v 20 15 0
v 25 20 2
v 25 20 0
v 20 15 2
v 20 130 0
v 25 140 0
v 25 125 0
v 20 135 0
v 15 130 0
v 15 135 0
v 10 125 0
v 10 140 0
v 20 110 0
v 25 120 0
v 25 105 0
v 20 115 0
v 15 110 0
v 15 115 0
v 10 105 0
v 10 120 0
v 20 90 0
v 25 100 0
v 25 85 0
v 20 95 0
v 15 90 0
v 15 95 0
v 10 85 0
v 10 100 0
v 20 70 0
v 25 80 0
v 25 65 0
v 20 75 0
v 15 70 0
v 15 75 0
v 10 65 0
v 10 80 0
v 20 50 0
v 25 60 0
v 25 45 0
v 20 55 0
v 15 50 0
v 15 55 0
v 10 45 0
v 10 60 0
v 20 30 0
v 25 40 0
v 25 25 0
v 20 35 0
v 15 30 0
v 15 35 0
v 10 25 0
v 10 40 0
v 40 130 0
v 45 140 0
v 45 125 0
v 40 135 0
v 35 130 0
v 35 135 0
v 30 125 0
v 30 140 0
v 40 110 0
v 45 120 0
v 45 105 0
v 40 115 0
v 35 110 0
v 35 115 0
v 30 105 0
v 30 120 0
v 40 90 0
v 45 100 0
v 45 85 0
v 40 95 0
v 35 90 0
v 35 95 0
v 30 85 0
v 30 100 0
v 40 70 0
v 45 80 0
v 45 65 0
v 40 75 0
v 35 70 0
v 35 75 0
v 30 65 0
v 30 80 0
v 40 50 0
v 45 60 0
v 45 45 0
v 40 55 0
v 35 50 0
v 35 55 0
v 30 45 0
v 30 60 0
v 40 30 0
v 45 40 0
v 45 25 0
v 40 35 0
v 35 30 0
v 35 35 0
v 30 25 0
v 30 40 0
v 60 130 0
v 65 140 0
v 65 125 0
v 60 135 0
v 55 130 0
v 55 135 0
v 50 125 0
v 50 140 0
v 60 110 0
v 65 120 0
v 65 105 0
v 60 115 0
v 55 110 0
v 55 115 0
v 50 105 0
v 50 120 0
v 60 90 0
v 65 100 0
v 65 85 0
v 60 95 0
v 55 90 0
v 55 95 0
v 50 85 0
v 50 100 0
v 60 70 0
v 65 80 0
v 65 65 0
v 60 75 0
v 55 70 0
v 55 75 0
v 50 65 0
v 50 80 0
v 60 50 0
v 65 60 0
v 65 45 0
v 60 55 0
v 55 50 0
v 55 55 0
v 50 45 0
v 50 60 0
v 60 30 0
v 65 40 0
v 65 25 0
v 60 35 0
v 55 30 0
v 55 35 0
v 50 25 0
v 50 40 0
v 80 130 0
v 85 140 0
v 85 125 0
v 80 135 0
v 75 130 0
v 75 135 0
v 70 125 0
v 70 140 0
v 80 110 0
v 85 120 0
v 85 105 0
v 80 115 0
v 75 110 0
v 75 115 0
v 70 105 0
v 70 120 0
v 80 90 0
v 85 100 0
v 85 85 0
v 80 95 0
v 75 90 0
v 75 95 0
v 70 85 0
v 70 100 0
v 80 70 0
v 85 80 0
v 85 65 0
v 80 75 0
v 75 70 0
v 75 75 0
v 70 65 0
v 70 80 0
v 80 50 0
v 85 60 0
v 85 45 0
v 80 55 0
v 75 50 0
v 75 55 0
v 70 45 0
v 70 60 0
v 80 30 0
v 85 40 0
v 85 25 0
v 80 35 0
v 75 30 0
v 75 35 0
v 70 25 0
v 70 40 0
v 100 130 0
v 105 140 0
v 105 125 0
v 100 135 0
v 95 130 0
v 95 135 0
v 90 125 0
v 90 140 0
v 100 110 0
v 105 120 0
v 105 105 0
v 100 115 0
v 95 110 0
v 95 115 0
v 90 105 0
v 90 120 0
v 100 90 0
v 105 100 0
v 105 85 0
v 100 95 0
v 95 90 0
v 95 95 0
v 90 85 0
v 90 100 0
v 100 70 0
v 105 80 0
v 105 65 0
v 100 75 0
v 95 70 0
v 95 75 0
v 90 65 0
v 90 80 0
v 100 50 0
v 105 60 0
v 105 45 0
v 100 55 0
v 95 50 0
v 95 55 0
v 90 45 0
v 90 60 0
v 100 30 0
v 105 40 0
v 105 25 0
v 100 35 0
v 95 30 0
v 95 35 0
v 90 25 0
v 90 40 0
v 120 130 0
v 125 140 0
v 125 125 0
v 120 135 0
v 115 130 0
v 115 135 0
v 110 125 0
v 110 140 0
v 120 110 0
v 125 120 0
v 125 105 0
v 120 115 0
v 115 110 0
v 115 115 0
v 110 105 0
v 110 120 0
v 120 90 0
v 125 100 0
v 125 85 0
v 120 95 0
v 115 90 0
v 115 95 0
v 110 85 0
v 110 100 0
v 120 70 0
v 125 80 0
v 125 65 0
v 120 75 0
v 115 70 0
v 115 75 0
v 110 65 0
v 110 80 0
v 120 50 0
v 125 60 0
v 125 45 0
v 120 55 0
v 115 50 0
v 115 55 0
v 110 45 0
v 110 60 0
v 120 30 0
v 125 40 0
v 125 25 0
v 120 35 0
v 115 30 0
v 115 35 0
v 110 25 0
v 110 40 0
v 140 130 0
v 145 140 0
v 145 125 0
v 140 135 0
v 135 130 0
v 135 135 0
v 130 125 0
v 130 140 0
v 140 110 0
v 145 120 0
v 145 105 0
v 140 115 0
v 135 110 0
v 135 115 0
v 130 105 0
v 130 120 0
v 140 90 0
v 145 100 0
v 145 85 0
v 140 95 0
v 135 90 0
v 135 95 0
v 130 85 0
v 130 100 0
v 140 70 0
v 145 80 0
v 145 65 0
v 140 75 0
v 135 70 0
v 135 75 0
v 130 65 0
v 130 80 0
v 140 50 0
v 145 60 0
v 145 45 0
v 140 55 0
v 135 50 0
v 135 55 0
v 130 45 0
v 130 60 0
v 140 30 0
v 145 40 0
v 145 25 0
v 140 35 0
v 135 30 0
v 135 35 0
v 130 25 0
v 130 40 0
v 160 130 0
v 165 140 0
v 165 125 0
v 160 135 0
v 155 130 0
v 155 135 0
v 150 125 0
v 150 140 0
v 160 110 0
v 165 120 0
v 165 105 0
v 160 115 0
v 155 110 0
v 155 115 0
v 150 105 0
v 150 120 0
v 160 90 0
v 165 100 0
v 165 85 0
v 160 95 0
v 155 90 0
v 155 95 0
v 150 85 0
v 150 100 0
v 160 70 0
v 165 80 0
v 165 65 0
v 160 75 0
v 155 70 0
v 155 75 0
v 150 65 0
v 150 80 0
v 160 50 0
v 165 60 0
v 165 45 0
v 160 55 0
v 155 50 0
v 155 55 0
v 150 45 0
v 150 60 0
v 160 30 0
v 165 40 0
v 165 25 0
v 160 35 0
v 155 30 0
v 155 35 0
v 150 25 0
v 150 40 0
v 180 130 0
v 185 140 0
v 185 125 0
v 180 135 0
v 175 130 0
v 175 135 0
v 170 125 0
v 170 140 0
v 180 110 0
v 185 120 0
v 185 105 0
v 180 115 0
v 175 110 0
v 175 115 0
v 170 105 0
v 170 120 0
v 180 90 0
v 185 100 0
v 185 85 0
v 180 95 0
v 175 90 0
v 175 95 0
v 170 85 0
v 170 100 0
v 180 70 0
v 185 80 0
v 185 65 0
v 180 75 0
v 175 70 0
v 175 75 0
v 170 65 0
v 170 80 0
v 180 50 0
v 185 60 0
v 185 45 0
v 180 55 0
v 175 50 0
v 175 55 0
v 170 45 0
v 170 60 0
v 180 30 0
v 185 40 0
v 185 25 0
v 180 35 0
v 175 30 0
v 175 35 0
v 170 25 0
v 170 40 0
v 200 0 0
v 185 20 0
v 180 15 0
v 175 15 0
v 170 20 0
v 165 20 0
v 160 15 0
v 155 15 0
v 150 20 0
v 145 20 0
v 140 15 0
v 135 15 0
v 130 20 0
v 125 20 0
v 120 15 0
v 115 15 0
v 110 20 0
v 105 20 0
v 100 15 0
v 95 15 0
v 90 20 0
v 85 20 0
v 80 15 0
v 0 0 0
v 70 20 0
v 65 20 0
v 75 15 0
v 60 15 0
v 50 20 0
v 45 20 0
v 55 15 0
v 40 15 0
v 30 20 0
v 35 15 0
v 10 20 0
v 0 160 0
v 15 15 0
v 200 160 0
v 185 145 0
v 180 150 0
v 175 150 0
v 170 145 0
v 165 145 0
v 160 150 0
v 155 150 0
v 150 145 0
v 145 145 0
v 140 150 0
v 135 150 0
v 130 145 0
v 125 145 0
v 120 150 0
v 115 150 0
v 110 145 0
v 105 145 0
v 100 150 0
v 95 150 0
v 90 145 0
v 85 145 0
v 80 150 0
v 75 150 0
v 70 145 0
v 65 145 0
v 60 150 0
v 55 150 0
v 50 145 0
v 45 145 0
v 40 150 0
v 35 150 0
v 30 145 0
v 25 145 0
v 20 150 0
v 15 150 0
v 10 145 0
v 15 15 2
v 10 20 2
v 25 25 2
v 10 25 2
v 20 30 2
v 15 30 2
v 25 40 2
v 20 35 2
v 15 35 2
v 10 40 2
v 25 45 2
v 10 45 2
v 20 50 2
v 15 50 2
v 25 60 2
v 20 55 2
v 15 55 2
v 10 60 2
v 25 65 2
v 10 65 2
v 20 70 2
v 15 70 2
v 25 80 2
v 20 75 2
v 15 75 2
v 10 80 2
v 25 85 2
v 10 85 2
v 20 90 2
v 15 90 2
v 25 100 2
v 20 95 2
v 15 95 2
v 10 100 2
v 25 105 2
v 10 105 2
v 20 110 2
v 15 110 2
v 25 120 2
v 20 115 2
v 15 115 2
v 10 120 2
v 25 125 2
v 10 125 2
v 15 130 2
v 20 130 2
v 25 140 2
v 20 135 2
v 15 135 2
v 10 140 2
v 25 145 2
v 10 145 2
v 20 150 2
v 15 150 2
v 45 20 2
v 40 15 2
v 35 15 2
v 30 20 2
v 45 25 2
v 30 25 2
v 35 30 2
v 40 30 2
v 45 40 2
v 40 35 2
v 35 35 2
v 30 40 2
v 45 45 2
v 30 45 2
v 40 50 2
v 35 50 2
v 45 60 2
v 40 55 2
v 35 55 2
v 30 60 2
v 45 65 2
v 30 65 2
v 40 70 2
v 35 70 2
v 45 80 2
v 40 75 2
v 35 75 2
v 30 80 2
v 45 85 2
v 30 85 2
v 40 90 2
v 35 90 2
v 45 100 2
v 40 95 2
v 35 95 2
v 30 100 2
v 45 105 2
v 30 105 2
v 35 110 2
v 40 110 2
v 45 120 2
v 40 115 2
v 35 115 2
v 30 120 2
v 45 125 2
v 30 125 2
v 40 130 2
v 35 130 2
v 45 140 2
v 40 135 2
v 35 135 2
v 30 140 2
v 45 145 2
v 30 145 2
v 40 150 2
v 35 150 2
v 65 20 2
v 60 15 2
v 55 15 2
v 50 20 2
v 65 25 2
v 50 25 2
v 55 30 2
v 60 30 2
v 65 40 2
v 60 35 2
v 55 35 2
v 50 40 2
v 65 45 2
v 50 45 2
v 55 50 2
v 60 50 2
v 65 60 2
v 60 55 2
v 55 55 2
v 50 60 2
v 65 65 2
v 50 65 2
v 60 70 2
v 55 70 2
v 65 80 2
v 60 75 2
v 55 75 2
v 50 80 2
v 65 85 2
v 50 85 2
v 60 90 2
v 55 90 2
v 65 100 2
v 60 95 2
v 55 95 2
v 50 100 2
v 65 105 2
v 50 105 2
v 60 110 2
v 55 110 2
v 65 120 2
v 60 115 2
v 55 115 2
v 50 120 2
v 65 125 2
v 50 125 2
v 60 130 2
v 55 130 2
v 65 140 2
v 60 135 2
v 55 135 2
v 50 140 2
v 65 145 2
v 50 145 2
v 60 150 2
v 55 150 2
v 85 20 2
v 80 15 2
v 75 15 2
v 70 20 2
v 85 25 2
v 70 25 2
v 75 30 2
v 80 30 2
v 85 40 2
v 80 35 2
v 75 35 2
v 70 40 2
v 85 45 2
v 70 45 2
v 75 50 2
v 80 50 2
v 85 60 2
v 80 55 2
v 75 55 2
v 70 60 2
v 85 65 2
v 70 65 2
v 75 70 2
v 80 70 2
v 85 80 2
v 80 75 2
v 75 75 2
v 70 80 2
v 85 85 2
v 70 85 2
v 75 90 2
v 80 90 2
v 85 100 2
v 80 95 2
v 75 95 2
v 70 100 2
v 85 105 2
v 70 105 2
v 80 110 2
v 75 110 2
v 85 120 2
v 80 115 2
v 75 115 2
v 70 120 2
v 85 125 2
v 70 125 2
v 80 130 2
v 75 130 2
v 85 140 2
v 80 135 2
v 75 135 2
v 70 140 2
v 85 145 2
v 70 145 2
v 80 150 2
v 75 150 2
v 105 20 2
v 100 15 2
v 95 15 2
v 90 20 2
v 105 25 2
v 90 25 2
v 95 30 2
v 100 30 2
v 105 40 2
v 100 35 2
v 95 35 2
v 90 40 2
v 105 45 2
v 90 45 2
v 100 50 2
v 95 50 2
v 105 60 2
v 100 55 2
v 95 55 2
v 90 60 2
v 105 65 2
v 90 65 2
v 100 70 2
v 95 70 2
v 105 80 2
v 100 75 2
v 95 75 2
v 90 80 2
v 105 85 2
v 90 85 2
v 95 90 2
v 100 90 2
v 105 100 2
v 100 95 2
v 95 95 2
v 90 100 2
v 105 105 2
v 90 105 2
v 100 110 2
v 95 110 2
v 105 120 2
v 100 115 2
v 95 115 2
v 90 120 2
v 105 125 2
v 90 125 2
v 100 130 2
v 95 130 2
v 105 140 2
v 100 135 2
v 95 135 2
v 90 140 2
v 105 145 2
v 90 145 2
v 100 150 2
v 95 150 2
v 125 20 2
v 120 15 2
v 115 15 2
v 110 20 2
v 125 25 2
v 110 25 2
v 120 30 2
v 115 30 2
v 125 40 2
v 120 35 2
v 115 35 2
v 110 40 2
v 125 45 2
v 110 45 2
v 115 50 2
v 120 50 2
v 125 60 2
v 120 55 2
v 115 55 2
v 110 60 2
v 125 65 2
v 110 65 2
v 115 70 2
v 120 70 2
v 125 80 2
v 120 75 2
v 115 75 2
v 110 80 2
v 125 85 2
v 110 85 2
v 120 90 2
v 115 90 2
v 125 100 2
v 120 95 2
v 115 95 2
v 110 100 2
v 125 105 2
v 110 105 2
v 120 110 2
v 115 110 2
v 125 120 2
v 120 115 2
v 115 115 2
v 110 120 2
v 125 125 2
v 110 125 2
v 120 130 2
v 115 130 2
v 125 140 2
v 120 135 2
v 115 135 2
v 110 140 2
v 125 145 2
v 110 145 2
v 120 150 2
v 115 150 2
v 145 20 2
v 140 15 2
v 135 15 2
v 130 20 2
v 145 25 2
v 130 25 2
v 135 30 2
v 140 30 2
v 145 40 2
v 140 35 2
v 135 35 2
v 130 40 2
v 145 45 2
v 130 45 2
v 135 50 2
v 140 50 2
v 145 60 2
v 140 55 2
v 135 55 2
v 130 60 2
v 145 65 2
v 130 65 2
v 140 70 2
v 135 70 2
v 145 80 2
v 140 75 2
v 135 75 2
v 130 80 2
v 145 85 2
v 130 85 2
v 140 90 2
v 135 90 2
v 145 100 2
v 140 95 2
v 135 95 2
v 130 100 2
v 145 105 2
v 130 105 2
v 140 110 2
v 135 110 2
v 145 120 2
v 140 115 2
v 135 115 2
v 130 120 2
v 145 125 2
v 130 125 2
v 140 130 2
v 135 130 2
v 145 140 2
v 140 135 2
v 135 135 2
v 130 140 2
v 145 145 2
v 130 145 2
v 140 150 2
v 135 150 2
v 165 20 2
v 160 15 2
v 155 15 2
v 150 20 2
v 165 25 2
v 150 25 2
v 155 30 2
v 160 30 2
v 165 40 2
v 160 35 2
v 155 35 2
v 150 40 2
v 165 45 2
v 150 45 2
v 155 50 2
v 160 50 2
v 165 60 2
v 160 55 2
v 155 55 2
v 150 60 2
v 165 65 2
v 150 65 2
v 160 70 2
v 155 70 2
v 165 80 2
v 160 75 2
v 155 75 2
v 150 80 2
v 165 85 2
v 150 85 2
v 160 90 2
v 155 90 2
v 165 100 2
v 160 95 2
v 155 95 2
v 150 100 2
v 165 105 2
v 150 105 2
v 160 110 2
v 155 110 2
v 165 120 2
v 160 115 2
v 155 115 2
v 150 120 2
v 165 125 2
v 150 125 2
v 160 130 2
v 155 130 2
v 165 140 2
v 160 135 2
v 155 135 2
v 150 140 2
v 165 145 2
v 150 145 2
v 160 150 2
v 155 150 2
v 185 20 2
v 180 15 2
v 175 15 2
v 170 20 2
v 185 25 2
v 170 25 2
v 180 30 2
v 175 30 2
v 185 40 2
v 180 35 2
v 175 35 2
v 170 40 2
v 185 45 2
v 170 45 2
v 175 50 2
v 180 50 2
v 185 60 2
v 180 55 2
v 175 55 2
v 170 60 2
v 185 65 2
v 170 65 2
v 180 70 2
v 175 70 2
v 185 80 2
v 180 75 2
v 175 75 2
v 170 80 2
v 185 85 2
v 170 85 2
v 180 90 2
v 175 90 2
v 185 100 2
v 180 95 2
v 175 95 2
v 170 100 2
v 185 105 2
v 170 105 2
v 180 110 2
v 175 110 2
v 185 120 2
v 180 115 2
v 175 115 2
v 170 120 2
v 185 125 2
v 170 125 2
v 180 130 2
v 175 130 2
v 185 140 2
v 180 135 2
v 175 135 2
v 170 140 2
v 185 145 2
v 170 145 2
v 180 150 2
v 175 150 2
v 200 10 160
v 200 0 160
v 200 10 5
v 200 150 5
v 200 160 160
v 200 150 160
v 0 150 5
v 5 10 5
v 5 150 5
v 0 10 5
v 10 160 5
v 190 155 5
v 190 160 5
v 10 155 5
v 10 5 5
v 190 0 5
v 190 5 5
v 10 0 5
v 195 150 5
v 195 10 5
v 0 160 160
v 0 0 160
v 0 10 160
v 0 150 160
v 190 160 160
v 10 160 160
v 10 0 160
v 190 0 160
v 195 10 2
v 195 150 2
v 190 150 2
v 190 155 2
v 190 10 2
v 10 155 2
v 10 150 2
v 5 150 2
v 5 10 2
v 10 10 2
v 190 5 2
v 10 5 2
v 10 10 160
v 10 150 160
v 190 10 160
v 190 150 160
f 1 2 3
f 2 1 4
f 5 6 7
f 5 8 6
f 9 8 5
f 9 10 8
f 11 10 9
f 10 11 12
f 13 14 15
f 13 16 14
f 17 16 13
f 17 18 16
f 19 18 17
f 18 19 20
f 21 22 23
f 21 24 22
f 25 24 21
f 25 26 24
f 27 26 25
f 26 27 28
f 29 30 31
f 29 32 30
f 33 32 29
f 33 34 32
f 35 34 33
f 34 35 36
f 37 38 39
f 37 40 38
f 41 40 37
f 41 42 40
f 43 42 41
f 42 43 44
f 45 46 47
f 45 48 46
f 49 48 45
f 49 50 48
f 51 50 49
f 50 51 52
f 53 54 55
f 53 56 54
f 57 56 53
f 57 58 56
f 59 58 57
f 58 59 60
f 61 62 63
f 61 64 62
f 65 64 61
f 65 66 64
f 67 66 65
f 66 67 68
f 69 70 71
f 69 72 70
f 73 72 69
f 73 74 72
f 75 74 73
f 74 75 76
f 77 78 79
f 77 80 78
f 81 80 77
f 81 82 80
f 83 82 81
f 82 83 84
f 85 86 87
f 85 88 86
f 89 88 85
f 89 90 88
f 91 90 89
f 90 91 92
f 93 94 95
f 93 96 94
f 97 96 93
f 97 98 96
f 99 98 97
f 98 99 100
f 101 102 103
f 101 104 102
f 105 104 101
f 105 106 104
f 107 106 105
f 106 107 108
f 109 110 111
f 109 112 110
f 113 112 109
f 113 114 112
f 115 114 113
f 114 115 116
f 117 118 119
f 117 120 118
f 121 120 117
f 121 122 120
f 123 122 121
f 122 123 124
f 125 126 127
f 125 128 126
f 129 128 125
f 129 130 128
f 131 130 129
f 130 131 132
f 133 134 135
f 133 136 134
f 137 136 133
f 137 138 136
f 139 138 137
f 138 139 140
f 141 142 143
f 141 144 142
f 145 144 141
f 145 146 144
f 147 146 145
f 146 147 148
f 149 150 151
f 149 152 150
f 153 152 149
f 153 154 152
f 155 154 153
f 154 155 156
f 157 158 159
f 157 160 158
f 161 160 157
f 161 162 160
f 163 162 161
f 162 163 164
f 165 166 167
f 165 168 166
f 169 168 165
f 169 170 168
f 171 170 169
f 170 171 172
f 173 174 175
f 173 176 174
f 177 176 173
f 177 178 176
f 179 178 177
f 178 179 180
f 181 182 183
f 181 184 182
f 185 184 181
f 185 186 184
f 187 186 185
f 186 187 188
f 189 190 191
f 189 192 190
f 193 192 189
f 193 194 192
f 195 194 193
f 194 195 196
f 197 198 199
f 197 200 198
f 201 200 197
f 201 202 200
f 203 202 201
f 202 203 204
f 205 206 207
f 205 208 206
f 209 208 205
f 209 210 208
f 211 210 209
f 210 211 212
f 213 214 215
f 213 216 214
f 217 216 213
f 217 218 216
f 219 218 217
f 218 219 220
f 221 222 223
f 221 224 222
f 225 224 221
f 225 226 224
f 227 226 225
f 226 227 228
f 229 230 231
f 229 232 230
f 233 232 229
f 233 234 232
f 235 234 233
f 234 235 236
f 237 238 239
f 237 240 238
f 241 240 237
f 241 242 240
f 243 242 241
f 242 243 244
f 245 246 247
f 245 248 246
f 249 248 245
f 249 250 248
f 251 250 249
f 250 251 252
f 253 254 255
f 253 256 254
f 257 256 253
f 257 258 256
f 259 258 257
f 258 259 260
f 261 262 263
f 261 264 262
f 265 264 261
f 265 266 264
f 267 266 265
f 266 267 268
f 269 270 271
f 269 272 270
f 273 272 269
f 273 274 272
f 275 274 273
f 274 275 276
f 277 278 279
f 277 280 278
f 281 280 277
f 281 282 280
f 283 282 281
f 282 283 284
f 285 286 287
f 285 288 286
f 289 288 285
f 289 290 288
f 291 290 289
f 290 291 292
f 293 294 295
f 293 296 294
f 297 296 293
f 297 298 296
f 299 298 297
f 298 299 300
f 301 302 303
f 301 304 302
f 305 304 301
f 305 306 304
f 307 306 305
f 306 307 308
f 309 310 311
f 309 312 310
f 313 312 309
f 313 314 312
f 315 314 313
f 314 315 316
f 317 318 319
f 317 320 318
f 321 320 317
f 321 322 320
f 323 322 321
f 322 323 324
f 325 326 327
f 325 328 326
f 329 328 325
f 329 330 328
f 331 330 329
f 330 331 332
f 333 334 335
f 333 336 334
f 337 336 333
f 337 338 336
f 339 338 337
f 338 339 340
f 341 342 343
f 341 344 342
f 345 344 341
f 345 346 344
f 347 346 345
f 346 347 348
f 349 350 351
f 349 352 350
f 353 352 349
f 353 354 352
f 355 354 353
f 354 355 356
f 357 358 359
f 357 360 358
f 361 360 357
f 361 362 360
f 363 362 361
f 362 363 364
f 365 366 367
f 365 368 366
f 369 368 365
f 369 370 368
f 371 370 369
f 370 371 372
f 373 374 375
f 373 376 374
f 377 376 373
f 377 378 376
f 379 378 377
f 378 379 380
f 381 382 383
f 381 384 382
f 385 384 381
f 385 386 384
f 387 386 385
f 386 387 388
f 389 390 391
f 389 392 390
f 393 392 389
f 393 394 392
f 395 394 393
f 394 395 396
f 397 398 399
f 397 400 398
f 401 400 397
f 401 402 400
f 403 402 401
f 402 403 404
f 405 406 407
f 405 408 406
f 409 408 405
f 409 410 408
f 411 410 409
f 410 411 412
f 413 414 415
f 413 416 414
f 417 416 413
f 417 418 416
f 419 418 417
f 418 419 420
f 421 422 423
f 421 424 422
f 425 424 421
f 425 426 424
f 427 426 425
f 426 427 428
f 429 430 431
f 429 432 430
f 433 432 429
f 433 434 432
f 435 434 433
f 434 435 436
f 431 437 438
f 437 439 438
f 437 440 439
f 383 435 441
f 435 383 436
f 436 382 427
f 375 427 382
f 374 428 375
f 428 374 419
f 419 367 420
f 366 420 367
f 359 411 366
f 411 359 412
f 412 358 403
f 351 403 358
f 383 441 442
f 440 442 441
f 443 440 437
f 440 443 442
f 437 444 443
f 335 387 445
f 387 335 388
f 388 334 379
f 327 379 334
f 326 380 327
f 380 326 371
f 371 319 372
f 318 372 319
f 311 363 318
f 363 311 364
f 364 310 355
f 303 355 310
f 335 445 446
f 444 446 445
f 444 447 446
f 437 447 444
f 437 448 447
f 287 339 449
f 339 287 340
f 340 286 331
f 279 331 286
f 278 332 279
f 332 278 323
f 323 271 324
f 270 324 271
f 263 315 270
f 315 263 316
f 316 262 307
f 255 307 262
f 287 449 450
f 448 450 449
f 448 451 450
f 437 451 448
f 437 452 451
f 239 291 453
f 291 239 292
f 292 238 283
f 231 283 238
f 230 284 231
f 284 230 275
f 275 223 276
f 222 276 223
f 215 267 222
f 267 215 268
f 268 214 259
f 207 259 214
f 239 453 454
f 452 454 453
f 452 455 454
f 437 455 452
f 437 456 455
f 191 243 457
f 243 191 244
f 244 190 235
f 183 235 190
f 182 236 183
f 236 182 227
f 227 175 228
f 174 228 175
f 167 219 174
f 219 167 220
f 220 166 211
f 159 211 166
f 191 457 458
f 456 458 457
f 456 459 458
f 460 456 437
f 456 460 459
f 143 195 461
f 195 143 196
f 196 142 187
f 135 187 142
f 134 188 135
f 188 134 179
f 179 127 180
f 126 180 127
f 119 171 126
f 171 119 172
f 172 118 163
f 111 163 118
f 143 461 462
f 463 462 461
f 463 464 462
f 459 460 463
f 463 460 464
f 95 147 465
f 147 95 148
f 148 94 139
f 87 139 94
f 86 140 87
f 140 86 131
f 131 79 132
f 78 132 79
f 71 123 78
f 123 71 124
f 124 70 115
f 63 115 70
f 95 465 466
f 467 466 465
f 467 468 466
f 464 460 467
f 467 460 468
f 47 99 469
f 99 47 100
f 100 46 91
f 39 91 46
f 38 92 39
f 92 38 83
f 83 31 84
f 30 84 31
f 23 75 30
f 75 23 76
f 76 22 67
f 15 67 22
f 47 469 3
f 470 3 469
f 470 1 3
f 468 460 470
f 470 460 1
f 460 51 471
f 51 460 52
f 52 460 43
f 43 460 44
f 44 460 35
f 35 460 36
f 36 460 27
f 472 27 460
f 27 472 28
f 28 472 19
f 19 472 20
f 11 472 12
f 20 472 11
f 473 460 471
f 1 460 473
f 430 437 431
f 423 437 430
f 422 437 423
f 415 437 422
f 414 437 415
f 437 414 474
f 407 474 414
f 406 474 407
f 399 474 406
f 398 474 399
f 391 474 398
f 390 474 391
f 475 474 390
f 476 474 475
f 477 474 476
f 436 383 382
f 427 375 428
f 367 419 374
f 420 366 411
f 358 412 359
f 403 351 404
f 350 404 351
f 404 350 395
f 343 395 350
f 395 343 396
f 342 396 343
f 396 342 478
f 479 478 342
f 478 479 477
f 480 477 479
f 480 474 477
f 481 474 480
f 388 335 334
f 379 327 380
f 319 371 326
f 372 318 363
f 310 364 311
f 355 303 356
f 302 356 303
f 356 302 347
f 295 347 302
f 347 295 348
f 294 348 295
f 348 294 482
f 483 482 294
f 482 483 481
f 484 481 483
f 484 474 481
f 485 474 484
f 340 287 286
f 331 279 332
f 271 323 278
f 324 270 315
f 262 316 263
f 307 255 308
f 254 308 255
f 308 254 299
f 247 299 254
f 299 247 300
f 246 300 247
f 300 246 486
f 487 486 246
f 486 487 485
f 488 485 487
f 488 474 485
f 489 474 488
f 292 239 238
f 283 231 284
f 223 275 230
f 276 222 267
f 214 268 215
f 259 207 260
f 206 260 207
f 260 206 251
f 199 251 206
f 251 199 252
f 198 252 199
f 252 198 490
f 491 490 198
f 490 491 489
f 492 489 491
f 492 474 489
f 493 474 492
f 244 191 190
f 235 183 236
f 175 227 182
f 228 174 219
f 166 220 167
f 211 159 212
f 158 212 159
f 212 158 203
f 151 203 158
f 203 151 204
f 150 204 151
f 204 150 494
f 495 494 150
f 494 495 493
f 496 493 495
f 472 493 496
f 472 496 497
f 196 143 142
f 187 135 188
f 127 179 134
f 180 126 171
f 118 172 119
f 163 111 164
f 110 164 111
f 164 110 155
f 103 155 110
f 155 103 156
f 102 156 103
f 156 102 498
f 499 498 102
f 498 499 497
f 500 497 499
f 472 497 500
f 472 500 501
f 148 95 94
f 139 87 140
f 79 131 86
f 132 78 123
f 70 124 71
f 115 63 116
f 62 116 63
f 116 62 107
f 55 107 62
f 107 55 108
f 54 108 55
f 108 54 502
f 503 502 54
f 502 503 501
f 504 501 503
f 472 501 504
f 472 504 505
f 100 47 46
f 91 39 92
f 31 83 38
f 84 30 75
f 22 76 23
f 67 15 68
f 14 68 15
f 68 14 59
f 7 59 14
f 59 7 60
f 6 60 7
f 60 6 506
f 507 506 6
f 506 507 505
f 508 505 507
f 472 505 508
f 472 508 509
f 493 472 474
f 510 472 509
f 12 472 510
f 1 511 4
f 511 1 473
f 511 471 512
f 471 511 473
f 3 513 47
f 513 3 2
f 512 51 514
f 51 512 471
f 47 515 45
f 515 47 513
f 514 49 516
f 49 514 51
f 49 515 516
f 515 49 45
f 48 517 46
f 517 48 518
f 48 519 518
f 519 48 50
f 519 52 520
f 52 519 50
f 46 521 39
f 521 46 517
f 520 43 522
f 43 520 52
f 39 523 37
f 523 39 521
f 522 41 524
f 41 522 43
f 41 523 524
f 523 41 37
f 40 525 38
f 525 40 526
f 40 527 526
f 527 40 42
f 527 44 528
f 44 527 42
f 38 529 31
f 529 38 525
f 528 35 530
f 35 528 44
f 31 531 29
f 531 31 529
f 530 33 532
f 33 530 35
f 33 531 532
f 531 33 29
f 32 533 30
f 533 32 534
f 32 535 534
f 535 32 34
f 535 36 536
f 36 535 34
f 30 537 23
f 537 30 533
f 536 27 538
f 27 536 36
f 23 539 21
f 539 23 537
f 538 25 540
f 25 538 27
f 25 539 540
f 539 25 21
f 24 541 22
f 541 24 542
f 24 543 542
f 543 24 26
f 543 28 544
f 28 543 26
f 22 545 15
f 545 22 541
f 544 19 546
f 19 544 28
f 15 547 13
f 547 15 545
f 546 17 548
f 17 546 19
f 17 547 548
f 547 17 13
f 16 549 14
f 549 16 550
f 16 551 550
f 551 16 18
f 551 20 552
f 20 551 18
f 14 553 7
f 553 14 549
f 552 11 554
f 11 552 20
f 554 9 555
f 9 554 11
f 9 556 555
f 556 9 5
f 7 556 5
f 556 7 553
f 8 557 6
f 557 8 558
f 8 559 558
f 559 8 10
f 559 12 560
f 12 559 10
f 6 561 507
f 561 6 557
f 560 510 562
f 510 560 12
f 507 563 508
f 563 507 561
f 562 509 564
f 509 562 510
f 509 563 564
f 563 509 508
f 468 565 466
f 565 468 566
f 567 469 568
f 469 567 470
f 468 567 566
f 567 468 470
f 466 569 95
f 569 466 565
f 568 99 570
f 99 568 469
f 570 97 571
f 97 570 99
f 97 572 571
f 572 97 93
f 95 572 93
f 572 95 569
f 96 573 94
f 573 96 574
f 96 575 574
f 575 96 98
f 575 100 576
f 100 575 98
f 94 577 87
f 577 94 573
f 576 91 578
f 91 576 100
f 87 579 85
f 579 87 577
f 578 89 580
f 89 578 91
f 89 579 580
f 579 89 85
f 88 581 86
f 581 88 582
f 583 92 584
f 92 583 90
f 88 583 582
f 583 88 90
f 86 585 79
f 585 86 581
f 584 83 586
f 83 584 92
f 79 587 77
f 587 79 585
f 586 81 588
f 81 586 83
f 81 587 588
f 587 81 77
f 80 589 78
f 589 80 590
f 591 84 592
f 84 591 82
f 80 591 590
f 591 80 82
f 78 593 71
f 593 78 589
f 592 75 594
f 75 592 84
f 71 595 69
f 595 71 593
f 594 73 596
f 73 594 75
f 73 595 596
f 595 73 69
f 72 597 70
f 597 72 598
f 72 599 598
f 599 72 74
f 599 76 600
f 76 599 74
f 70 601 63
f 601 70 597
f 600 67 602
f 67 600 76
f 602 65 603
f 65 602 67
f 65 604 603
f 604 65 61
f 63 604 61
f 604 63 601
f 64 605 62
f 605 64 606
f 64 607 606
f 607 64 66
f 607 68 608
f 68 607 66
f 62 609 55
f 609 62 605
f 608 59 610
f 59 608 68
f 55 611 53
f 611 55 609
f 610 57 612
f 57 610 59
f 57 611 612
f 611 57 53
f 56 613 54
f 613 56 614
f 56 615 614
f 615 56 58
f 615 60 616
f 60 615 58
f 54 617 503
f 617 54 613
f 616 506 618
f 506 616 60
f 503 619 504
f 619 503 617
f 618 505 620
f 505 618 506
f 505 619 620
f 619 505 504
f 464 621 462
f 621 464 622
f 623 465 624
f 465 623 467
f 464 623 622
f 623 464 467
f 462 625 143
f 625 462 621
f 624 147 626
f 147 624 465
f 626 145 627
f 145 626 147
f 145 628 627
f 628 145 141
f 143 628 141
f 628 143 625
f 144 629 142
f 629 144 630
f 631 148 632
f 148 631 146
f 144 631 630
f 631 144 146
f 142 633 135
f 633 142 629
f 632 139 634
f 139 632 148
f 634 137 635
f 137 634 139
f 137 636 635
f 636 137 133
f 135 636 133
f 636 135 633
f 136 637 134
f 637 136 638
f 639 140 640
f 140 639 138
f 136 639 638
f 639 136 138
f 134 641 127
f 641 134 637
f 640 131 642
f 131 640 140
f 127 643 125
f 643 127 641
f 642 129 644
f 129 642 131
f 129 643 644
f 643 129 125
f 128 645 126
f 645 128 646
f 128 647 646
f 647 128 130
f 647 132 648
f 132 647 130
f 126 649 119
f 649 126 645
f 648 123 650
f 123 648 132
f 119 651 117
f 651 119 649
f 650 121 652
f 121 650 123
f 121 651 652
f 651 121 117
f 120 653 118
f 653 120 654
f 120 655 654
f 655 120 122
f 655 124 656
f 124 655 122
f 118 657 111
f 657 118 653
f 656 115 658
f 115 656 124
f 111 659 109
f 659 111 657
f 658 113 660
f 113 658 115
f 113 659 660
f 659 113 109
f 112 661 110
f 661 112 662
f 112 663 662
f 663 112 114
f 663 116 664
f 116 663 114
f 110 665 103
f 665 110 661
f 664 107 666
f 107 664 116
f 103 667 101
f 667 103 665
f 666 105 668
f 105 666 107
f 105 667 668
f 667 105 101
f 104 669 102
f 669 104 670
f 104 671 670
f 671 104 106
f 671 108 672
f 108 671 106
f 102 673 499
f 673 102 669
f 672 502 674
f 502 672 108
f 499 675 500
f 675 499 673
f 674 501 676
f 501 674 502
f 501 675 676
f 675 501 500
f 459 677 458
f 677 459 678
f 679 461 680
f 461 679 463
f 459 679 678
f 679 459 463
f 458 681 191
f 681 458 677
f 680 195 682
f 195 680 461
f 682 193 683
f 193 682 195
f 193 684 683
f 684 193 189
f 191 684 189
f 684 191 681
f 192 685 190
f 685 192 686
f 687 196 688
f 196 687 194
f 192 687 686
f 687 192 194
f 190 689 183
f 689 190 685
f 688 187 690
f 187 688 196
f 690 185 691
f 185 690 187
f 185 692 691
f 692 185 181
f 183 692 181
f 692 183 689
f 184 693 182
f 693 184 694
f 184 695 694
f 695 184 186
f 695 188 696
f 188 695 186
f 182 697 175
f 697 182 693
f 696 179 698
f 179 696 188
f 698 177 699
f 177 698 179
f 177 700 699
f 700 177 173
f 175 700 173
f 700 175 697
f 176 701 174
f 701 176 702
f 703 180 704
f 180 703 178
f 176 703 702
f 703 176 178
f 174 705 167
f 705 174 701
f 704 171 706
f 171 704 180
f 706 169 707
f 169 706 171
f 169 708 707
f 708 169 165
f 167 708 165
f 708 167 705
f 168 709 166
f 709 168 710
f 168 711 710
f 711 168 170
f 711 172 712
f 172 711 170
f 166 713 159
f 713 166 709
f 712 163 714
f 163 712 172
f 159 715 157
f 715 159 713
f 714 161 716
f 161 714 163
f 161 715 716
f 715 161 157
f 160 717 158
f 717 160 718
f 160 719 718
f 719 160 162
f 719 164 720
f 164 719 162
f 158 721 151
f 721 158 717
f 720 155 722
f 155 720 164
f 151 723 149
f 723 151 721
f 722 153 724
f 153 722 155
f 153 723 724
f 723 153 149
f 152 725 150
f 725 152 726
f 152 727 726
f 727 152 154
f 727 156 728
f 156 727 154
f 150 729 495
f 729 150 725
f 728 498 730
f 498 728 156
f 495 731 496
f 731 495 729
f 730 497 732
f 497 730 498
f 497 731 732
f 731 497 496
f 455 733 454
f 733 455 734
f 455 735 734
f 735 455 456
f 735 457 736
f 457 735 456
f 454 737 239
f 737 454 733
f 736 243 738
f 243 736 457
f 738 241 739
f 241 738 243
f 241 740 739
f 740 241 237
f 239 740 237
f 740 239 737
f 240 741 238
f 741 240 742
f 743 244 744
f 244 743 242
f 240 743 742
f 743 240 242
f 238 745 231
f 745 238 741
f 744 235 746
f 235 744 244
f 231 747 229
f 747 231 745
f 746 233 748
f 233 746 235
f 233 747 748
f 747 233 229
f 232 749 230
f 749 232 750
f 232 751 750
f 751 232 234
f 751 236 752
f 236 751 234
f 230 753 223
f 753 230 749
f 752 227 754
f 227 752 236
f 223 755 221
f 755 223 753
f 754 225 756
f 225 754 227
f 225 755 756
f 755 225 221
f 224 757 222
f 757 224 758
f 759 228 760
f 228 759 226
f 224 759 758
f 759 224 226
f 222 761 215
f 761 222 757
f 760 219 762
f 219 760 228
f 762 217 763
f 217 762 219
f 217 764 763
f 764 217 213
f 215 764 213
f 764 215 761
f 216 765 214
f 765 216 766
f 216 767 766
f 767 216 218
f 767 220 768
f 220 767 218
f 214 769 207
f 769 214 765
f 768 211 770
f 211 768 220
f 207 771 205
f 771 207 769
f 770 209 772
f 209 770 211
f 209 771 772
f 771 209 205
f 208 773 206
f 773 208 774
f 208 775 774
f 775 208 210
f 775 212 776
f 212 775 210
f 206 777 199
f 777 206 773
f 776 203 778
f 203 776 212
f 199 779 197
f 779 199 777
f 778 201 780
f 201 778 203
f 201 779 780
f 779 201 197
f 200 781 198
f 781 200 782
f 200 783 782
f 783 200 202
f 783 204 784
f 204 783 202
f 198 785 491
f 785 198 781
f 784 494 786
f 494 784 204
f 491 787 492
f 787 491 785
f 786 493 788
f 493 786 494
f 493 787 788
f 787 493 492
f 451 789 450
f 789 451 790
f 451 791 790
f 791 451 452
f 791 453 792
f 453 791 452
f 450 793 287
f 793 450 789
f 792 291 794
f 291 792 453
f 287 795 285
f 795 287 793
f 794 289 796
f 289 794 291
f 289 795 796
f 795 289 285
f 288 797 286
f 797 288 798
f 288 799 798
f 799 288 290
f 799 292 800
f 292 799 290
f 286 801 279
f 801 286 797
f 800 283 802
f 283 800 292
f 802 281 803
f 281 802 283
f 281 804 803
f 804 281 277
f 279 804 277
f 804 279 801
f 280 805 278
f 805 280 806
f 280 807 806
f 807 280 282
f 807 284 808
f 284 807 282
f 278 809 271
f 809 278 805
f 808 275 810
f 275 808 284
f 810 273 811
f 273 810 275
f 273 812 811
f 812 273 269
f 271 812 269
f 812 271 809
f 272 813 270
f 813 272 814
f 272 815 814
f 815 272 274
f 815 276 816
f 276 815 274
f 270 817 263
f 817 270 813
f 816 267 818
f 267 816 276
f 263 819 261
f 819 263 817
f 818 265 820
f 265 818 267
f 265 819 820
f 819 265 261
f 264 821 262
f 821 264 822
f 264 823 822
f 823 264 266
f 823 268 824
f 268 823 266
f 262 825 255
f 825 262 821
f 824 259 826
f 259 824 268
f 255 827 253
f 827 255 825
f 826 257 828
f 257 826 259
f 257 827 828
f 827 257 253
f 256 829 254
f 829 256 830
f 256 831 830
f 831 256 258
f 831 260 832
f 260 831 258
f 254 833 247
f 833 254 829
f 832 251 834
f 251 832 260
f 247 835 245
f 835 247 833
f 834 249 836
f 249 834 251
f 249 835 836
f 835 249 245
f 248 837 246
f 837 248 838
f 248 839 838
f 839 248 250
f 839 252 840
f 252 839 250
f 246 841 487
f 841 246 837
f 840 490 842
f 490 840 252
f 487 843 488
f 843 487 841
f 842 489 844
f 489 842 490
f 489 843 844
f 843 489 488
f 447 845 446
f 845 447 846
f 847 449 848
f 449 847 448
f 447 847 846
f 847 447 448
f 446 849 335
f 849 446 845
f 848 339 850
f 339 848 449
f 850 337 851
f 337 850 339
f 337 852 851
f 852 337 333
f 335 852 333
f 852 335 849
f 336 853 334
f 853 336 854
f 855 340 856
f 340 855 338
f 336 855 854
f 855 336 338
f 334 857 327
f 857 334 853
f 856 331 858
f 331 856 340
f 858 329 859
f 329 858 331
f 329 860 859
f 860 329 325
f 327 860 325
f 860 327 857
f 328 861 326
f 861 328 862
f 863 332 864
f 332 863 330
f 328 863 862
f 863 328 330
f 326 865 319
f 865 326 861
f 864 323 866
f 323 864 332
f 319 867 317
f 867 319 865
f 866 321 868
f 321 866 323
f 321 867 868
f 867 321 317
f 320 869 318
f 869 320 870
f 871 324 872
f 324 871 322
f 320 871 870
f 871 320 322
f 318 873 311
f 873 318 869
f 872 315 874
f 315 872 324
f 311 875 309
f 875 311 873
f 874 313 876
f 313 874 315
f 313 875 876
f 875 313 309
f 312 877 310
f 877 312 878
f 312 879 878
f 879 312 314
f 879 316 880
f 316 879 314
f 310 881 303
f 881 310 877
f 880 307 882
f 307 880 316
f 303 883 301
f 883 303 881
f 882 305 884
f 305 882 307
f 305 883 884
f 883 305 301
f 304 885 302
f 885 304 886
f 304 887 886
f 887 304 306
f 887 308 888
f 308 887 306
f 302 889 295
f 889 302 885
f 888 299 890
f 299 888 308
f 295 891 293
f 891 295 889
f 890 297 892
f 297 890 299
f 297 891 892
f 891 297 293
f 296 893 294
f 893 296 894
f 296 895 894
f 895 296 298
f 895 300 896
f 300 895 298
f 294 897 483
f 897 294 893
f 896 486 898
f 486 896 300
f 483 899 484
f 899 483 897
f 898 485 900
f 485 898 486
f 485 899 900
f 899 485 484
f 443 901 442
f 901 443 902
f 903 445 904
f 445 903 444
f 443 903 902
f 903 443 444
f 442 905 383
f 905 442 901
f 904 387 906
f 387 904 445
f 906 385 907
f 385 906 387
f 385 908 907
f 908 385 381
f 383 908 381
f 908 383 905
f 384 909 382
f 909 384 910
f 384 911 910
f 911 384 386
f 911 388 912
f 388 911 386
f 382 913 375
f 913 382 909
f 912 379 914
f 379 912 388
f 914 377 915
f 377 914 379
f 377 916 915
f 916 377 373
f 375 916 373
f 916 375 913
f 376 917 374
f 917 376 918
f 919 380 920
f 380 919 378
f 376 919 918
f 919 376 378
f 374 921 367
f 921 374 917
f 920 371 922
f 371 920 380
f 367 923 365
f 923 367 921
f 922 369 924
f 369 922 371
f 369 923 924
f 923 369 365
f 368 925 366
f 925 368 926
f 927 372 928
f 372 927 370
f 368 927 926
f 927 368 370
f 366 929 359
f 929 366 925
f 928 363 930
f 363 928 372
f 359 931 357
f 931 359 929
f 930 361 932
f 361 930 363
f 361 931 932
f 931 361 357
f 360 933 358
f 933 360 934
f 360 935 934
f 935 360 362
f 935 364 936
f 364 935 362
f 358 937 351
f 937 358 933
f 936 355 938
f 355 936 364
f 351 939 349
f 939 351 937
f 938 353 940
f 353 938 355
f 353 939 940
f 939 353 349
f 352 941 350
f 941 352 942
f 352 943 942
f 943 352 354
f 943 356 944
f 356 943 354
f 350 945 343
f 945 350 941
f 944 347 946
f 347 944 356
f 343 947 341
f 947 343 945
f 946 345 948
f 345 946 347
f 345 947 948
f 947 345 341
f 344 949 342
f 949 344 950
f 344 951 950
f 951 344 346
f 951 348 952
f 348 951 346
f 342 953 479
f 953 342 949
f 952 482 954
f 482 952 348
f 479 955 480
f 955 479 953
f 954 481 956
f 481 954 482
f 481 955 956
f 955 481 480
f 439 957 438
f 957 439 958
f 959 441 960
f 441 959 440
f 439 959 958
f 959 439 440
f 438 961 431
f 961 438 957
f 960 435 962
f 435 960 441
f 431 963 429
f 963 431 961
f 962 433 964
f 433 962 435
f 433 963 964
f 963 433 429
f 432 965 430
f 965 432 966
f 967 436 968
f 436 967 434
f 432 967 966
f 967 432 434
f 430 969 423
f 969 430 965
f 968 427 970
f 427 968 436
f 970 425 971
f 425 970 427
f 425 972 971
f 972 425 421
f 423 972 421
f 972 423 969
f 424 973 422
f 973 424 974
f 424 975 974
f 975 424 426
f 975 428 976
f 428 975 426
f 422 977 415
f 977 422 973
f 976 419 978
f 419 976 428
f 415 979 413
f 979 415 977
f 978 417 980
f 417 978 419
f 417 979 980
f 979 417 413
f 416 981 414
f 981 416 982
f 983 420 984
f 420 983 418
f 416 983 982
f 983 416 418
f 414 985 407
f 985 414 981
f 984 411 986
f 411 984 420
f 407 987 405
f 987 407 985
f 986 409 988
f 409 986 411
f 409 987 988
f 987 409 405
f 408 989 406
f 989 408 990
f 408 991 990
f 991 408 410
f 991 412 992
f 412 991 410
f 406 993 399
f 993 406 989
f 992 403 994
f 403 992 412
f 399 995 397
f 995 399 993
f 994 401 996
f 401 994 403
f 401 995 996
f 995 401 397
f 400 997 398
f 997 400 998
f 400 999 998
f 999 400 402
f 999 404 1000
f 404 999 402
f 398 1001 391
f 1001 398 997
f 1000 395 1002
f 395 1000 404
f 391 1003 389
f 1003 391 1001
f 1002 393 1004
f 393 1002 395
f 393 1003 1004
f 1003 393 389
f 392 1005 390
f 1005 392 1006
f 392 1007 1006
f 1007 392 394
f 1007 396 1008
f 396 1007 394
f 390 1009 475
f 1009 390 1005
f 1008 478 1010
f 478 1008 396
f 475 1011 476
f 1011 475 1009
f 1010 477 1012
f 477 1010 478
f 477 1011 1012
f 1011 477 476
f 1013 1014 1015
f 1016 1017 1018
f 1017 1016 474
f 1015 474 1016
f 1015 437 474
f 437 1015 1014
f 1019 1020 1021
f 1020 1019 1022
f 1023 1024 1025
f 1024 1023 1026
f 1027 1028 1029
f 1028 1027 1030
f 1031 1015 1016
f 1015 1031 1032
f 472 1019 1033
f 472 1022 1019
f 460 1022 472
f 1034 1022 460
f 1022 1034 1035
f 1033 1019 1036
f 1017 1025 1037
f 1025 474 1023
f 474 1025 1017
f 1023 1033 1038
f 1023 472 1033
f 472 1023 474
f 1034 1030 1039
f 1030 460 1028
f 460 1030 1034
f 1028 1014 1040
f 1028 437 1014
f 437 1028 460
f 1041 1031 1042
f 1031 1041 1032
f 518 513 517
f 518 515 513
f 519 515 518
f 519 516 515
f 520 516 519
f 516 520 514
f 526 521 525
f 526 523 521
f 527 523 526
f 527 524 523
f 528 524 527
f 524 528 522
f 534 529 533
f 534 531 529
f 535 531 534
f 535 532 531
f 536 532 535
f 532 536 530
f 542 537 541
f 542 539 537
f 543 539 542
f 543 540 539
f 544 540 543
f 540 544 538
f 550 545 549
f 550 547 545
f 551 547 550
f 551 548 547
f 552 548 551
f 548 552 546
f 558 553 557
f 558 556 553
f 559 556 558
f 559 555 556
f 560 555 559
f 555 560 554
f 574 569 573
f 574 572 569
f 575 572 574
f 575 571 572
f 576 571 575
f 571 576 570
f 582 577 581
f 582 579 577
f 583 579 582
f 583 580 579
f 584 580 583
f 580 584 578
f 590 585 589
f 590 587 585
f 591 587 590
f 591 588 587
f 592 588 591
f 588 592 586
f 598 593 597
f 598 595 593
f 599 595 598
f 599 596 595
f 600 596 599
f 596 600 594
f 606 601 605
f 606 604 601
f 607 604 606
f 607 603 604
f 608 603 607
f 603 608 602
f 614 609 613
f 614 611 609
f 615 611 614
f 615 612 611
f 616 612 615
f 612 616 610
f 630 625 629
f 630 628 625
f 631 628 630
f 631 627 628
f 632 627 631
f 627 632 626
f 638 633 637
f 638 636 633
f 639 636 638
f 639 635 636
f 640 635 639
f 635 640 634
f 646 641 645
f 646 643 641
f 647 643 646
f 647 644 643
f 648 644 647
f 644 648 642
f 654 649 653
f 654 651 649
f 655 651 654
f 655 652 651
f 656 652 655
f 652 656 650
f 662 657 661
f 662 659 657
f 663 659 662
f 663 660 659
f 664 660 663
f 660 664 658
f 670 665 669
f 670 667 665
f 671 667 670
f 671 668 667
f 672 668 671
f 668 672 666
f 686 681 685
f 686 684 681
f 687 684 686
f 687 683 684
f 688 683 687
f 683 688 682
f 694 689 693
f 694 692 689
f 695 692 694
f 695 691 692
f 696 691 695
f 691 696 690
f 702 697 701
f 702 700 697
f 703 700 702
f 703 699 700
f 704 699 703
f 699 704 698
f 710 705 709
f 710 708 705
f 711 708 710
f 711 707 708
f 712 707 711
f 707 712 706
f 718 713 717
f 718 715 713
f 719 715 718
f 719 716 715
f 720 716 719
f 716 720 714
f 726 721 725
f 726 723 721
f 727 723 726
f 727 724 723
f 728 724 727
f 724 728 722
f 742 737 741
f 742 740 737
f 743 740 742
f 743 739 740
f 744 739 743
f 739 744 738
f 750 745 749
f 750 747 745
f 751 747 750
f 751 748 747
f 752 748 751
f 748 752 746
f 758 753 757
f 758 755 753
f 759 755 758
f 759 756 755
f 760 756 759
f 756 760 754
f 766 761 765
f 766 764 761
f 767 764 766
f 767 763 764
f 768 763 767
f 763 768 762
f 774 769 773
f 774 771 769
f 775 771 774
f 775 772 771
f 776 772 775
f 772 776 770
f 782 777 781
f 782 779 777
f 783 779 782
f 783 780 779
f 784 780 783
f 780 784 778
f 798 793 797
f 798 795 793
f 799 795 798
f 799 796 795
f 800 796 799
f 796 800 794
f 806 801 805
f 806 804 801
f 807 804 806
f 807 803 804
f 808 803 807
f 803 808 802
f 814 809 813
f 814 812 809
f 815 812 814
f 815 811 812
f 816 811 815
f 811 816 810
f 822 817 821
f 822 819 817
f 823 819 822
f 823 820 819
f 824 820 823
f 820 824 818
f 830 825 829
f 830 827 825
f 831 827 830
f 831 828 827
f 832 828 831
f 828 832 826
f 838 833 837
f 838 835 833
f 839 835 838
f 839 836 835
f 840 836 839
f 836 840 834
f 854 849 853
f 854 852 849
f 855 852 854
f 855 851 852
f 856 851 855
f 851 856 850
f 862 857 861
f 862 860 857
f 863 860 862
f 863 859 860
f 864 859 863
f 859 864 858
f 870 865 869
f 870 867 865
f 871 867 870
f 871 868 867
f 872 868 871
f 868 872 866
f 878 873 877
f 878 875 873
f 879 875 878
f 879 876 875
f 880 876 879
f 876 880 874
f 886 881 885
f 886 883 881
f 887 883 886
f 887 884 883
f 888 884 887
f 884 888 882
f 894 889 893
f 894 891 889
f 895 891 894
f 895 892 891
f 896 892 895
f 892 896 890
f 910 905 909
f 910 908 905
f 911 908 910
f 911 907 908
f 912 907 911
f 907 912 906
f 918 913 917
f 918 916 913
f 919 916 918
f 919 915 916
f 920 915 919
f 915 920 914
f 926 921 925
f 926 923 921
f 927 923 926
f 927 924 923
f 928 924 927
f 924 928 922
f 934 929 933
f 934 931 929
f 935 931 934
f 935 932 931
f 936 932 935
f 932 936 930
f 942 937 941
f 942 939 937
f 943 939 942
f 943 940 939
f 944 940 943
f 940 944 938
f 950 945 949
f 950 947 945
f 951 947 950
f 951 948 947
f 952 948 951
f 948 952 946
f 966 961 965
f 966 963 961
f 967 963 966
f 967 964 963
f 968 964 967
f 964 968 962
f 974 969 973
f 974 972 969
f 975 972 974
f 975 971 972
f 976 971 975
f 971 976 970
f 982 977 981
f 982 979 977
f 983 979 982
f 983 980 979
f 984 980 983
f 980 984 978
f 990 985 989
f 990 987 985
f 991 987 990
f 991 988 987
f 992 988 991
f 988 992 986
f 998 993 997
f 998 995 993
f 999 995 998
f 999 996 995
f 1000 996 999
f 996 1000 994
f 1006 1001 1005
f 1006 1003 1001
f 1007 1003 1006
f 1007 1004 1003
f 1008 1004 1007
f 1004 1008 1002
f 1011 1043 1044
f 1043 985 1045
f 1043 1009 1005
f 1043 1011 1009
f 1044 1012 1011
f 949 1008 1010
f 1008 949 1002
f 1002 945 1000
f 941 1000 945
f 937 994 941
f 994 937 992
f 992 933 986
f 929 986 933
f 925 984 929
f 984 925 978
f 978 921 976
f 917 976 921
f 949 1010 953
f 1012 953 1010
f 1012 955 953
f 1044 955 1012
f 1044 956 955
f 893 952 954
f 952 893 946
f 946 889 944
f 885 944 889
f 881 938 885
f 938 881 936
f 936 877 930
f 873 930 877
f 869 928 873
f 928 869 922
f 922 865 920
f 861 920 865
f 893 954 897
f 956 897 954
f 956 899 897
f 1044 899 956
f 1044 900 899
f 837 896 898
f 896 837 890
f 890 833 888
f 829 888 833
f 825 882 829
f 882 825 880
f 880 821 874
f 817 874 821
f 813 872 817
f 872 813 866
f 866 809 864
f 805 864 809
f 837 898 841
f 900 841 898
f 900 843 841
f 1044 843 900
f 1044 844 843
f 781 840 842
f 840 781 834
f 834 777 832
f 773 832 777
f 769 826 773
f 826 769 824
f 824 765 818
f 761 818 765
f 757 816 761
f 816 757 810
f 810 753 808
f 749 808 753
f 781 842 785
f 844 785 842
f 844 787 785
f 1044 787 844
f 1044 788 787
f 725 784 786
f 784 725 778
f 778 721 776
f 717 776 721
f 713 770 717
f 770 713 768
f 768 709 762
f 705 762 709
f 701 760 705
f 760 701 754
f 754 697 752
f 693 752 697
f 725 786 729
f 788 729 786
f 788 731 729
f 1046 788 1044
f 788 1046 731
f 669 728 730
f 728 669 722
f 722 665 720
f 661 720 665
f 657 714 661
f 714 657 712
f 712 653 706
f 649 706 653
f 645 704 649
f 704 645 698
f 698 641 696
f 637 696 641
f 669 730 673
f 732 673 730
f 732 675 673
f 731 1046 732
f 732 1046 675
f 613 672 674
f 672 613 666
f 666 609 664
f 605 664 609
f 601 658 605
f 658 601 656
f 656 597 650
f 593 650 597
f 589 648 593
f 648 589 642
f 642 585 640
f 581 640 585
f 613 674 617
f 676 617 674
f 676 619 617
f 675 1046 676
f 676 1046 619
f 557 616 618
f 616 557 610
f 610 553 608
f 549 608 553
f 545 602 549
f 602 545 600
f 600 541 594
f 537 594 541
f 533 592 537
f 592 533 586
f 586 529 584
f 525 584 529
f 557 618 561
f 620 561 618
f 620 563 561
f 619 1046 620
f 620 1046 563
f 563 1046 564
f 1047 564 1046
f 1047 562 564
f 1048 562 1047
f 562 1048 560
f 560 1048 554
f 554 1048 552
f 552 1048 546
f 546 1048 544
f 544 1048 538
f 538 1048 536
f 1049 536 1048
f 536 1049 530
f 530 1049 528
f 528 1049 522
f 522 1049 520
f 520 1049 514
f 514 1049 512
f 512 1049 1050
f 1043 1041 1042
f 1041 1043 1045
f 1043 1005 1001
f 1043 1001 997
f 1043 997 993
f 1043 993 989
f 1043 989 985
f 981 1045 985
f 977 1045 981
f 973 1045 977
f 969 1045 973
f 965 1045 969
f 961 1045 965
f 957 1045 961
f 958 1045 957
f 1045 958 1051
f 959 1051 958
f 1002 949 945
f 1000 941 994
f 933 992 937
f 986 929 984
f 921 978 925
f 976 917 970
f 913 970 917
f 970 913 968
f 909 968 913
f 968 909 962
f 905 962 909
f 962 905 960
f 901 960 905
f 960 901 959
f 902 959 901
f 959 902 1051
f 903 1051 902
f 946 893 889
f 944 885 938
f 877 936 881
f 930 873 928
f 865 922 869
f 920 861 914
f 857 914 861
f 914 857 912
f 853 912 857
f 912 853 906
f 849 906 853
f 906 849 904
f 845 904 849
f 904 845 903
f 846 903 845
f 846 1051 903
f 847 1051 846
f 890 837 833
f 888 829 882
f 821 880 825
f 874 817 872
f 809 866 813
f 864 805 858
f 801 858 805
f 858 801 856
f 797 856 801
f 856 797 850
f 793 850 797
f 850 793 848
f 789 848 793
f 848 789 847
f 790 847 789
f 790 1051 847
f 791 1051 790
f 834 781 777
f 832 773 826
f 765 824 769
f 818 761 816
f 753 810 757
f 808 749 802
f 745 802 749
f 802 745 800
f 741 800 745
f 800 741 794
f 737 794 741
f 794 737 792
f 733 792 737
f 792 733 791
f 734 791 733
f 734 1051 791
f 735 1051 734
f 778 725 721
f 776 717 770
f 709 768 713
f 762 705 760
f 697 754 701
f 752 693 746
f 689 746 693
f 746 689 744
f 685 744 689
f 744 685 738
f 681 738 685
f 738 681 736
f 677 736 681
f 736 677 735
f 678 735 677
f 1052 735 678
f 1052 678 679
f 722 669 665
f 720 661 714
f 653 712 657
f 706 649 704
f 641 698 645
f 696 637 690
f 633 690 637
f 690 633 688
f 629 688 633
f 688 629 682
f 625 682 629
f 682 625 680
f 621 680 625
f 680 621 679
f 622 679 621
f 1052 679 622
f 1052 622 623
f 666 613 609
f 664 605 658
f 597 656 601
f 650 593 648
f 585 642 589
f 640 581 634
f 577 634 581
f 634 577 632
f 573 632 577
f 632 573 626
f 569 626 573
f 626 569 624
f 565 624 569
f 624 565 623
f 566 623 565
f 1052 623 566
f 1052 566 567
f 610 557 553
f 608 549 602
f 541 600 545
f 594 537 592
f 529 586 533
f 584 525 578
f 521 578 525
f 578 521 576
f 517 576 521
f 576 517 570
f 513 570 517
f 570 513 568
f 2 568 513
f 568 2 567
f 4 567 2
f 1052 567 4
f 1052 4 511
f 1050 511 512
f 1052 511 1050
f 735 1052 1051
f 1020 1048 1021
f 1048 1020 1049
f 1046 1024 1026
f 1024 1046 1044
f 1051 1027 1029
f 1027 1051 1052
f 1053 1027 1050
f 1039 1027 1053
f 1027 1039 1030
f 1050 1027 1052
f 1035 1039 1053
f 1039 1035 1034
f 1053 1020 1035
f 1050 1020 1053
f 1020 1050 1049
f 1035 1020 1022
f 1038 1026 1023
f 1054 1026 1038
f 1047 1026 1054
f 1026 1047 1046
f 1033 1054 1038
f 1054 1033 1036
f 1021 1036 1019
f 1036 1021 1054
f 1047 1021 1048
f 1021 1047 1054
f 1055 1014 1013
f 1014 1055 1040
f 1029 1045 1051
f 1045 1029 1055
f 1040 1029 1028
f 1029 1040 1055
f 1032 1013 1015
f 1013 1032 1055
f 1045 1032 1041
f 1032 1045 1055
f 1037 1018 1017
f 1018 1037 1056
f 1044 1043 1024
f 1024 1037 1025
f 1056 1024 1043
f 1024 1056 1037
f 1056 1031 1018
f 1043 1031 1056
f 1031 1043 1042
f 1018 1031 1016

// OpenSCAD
$fn=360;
difference () {
  cube([200,160,5]);
  translate([5,5,2])
  cube([200-10,160-10,3]);  
  for ( x1 = [10,30,50,70,90,110,130,150,170])
        for ( y1 = [10,30,50,70,90,110,130]) {
            translate([x1,y1,0])
            linear_extrude(height = 5)
            polygon([[5,5],[10,5],[15,10],[10,10],[0,10]]);
            translate([x1,y1+5,0])
            linear_extrude(height = 5)
            polygon([[0,5],[15,5],[15,10],[5,10],[0,10]]);
            translate([x1,y1+5,0])
            linear_extrude(height = 5)
            polygon([[0,10],[5,15],[10,15],[15,10]]);
        }
}
for ( x2 = [0,190]) {
  for ( y2 = [0,150]) {
    translate([x2,y2,0])
    cube([10,10,160]);
  }
}
